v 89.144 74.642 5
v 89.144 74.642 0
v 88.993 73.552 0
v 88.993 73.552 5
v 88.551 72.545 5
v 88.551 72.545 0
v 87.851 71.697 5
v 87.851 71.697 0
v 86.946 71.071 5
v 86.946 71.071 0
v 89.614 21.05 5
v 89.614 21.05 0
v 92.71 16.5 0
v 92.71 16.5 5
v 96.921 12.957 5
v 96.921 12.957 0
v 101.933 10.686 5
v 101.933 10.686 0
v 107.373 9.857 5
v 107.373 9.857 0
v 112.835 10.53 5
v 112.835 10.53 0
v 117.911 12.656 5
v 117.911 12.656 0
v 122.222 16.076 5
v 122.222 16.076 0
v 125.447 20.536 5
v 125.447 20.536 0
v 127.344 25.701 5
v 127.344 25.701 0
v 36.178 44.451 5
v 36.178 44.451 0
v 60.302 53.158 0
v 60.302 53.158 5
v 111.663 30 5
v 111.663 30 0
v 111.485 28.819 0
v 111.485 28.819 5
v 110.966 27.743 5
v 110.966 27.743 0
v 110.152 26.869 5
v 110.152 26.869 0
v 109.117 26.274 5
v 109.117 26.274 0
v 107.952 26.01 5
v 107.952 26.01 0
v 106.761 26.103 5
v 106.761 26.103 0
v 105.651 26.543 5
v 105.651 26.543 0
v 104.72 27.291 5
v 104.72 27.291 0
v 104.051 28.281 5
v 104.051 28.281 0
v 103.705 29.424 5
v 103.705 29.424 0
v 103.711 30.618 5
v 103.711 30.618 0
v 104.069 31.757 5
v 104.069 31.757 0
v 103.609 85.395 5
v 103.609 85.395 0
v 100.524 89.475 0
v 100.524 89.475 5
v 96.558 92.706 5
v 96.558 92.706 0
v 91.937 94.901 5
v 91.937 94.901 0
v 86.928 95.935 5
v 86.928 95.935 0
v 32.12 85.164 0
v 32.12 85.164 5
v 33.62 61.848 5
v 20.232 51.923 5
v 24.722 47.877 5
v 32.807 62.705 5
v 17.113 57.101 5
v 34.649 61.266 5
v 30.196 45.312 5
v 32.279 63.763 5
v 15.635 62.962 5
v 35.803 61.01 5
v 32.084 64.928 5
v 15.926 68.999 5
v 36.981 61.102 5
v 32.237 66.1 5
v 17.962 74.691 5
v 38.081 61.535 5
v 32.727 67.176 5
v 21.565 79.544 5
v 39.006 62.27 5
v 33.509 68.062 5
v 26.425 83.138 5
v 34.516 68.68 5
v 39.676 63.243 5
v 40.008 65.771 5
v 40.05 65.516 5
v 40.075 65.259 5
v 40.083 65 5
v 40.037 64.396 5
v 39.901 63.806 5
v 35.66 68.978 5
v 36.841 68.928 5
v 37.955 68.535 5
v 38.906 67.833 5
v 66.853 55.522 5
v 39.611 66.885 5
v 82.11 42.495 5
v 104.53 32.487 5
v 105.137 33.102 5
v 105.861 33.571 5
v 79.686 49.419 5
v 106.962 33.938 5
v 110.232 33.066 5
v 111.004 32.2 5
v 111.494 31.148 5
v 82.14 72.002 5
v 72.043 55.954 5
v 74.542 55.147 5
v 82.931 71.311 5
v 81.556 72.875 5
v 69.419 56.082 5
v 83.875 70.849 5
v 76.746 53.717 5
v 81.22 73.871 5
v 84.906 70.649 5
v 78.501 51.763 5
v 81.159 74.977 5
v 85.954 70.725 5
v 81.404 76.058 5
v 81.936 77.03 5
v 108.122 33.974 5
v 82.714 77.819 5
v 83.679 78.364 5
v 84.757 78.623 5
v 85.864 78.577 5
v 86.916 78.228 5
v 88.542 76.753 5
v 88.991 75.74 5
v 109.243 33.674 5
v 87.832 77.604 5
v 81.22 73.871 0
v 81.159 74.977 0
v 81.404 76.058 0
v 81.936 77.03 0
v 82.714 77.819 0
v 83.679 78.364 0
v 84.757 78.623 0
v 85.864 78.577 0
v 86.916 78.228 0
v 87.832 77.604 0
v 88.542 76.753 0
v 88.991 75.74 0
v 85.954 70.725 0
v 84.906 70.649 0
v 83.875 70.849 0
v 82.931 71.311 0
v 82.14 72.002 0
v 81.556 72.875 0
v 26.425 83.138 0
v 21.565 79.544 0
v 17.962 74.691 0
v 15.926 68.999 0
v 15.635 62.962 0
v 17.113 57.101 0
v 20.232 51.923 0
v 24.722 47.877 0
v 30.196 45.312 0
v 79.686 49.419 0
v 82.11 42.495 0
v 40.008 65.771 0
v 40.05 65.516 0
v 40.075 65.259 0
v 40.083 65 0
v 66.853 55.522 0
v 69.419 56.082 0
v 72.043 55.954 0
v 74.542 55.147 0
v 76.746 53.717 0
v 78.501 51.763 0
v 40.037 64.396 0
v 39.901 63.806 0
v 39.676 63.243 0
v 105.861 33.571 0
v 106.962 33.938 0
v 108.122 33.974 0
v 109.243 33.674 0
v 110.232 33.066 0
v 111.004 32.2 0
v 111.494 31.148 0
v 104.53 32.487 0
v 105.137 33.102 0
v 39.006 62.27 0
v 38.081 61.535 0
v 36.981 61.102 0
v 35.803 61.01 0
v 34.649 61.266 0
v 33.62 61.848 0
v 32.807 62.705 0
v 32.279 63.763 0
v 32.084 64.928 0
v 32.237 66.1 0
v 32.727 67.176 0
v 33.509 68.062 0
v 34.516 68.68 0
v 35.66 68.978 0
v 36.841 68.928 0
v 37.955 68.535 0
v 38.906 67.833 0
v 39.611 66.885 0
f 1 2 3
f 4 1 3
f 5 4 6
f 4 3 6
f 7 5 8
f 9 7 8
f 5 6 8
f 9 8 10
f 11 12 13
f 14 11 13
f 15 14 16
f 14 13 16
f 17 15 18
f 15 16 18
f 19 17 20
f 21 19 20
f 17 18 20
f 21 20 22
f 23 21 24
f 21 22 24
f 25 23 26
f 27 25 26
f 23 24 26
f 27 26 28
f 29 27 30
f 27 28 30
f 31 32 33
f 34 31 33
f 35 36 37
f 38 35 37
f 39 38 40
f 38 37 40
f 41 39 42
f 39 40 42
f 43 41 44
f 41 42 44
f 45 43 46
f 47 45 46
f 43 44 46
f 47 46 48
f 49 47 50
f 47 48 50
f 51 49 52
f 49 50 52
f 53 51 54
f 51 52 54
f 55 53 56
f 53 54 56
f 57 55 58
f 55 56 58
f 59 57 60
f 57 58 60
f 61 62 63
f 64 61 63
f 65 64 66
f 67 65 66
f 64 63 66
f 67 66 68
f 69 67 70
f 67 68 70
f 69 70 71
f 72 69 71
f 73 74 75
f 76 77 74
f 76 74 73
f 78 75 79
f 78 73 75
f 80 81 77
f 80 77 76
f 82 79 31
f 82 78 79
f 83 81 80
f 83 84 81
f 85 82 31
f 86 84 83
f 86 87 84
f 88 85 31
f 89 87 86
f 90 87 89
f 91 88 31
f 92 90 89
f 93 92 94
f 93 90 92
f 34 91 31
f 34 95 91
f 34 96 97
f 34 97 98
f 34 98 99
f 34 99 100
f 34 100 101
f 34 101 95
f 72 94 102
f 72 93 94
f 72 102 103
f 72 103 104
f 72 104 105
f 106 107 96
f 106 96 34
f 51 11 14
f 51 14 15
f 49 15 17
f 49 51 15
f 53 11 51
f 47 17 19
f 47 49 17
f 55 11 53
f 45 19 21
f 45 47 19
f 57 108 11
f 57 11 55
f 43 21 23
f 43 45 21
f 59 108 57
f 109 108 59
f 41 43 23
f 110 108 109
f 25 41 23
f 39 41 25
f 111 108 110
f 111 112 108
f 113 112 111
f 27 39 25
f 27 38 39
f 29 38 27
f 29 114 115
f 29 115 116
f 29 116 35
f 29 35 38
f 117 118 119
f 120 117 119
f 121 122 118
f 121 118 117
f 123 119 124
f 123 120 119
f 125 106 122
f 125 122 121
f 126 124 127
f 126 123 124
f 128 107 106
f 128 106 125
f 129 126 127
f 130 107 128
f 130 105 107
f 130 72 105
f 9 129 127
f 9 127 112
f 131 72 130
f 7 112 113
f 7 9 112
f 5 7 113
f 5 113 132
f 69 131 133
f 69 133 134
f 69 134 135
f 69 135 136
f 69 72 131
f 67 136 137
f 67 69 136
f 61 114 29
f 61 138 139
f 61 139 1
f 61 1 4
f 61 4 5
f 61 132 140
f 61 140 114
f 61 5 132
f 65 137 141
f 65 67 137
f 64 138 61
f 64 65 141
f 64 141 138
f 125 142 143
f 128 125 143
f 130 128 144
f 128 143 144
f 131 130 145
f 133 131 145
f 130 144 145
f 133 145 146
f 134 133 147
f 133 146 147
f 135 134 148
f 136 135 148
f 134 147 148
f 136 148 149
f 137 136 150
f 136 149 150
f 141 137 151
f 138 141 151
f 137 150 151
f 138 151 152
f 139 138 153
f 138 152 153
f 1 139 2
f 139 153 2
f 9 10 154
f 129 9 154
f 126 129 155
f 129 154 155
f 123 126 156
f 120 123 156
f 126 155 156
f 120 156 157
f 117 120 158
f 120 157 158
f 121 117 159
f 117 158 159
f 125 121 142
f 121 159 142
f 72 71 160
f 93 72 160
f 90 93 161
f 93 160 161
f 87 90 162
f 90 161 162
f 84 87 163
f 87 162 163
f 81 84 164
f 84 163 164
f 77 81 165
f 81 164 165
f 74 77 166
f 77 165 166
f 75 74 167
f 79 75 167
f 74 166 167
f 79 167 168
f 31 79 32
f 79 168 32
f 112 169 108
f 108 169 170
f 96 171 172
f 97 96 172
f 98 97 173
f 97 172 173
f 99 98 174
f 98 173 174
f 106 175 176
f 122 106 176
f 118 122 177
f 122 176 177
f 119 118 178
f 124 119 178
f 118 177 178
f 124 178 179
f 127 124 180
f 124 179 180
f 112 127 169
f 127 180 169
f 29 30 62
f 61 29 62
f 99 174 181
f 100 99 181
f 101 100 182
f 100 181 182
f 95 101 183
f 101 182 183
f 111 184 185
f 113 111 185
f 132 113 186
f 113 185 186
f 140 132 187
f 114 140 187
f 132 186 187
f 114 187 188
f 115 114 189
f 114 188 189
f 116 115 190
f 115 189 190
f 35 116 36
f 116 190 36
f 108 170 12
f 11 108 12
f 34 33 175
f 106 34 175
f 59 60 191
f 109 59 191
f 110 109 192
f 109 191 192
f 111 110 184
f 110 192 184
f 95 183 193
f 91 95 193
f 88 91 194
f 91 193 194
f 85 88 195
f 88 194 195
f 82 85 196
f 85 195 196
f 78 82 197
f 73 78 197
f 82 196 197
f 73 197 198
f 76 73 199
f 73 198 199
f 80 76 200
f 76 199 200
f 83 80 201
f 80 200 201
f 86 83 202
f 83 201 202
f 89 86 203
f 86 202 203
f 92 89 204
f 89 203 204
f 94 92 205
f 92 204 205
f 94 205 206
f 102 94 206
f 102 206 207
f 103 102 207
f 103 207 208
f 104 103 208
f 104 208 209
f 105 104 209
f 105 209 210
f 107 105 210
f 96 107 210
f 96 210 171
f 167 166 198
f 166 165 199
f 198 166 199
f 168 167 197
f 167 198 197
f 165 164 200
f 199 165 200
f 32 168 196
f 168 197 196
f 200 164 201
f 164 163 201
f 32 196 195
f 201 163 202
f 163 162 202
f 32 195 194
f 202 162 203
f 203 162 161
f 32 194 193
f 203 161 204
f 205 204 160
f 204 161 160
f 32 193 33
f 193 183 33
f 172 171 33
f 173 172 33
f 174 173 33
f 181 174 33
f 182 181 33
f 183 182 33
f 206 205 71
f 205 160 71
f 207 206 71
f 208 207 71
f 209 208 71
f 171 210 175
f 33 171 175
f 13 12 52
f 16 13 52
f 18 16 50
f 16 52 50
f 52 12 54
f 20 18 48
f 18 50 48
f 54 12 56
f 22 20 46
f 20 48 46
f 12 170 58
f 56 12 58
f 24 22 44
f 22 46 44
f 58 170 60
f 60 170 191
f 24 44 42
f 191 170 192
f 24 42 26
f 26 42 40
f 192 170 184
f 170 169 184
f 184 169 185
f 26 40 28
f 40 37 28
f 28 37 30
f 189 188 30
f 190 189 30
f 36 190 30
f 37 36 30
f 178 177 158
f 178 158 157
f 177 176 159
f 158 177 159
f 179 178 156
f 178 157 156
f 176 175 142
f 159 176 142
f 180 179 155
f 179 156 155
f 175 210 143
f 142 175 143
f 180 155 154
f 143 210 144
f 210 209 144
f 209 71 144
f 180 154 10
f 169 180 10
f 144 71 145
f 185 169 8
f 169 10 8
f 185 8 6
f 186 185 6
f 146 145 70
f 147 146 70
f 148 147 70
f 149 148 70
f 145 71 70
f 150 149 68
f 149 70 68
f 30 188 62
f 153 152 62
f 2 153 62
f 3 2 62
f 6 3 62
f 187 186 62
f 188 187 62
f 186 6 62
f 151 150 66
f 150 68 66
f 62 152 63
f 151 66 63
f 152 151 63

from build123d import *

# Parameters (mm, degrees)
EXTRUDE_1_DEPTH = 5


with BuildPart() as part:
    # 草图1 → 凸台-拉伸1 (new body)
    with BuildSketch(Plane.XY):
        with BuildLine():
            ThreePointArc((39.676398778, 63.242940301), (32.116908157, 65.519966744), (40.007886711, 65.771373436))
            Line((40.007886711, 65.771373436), (81.219528006, 73.870794511))
            ThreePointArc((81.219528006, 73.870794511), (84.756936789, 78.623353252), (89.144446225, 74.642167947))
            ThreePointArc((89.144446225, 74.642167947), (88.550754884, 72.545250848), (86.945915565, 71.070794511))
            Line((86.945915565, 71.070794511), (105.861343633, 33.571373436))
            ThreePointArc((105.861343633, 33.571373436), (109.759730072, 33.406308659), (111.662812973, 30))
            ThreePointArc((111.662812973, 30), (106.761070533, 26.102967723), (104.069382688, 31.757059699))
            Line((104.069382688, 31.757059699), (82.109783132, 42.494523437))
            Line((82.109783132, 42.494523437), (89.614398352, 21.050380059))
            ThreePointArc((89.614398352, 21.050380059), (110.127424639, 10.005834432), (127.344312529, 25.70121614))
            Line((127.344312529, 25.70121614), (103.609378398, 85.394704235))
            ThreePointArc((103.609378398, 85.394704235), (96.558072376, 92.705940943), (86.927534136, 95.93515633))
            Line((86.927534136, 95.93515633), (32.120142981, 85.163730465))
            ThreePointArc((32.120142981, 85.163730465), (15.634853586, 62.961714189), (36.178446258, 44.450768961))
            Line((36.178446258, 44.450768961), (60.302024626, 53.157742297))
            Line((60.302024626, 53.157742297), (39.676398778, 63.242940301))
        make_face()
        with BuildLine():
            Line((81.219528006, 73.870794511), (40.007886711, 65.771373436))
            ThreePointArc((40.007886711, 65.771373436), (40.064153798, 65.387509436), (40.082968492, 65))
            ThreePointArc((40.082968492, 65), (39.98000077, 64.098257559), (39.676398778, 63.242940301))
            Line((39.676398778, 63.242940301), (60.302024626, 53.157742297))
            Line((60.302024626, 53.157742297), (66.852758603, 55.522112342))
            ThreePointArc((66.852758603, 55.522112342), (74.542251323, 55.146923882), (79.686411635, 49.419212353))
            Line((79.686411635, 49.419212353), (82.109783132, 42.494523437))
            Line((82.109783132, 42.494523437), (104.069382688, 31.757059699))
            ThreePointArc((104.069382688, 31.757059699), (104.816909062, 32.810841675), (105.861343633, 33.571373436))
            Line((105.861343633, 33.571373436), (86.945915565, 71.070794511))
            ThreePointArc((86.945915565, 71.070794511), (83.387386526, 71.048737661), (81.219528006, 73.870794511))
        make_face()
    extrude(amount=EXTRUDE_1_DEPTH)


solid = part.part
